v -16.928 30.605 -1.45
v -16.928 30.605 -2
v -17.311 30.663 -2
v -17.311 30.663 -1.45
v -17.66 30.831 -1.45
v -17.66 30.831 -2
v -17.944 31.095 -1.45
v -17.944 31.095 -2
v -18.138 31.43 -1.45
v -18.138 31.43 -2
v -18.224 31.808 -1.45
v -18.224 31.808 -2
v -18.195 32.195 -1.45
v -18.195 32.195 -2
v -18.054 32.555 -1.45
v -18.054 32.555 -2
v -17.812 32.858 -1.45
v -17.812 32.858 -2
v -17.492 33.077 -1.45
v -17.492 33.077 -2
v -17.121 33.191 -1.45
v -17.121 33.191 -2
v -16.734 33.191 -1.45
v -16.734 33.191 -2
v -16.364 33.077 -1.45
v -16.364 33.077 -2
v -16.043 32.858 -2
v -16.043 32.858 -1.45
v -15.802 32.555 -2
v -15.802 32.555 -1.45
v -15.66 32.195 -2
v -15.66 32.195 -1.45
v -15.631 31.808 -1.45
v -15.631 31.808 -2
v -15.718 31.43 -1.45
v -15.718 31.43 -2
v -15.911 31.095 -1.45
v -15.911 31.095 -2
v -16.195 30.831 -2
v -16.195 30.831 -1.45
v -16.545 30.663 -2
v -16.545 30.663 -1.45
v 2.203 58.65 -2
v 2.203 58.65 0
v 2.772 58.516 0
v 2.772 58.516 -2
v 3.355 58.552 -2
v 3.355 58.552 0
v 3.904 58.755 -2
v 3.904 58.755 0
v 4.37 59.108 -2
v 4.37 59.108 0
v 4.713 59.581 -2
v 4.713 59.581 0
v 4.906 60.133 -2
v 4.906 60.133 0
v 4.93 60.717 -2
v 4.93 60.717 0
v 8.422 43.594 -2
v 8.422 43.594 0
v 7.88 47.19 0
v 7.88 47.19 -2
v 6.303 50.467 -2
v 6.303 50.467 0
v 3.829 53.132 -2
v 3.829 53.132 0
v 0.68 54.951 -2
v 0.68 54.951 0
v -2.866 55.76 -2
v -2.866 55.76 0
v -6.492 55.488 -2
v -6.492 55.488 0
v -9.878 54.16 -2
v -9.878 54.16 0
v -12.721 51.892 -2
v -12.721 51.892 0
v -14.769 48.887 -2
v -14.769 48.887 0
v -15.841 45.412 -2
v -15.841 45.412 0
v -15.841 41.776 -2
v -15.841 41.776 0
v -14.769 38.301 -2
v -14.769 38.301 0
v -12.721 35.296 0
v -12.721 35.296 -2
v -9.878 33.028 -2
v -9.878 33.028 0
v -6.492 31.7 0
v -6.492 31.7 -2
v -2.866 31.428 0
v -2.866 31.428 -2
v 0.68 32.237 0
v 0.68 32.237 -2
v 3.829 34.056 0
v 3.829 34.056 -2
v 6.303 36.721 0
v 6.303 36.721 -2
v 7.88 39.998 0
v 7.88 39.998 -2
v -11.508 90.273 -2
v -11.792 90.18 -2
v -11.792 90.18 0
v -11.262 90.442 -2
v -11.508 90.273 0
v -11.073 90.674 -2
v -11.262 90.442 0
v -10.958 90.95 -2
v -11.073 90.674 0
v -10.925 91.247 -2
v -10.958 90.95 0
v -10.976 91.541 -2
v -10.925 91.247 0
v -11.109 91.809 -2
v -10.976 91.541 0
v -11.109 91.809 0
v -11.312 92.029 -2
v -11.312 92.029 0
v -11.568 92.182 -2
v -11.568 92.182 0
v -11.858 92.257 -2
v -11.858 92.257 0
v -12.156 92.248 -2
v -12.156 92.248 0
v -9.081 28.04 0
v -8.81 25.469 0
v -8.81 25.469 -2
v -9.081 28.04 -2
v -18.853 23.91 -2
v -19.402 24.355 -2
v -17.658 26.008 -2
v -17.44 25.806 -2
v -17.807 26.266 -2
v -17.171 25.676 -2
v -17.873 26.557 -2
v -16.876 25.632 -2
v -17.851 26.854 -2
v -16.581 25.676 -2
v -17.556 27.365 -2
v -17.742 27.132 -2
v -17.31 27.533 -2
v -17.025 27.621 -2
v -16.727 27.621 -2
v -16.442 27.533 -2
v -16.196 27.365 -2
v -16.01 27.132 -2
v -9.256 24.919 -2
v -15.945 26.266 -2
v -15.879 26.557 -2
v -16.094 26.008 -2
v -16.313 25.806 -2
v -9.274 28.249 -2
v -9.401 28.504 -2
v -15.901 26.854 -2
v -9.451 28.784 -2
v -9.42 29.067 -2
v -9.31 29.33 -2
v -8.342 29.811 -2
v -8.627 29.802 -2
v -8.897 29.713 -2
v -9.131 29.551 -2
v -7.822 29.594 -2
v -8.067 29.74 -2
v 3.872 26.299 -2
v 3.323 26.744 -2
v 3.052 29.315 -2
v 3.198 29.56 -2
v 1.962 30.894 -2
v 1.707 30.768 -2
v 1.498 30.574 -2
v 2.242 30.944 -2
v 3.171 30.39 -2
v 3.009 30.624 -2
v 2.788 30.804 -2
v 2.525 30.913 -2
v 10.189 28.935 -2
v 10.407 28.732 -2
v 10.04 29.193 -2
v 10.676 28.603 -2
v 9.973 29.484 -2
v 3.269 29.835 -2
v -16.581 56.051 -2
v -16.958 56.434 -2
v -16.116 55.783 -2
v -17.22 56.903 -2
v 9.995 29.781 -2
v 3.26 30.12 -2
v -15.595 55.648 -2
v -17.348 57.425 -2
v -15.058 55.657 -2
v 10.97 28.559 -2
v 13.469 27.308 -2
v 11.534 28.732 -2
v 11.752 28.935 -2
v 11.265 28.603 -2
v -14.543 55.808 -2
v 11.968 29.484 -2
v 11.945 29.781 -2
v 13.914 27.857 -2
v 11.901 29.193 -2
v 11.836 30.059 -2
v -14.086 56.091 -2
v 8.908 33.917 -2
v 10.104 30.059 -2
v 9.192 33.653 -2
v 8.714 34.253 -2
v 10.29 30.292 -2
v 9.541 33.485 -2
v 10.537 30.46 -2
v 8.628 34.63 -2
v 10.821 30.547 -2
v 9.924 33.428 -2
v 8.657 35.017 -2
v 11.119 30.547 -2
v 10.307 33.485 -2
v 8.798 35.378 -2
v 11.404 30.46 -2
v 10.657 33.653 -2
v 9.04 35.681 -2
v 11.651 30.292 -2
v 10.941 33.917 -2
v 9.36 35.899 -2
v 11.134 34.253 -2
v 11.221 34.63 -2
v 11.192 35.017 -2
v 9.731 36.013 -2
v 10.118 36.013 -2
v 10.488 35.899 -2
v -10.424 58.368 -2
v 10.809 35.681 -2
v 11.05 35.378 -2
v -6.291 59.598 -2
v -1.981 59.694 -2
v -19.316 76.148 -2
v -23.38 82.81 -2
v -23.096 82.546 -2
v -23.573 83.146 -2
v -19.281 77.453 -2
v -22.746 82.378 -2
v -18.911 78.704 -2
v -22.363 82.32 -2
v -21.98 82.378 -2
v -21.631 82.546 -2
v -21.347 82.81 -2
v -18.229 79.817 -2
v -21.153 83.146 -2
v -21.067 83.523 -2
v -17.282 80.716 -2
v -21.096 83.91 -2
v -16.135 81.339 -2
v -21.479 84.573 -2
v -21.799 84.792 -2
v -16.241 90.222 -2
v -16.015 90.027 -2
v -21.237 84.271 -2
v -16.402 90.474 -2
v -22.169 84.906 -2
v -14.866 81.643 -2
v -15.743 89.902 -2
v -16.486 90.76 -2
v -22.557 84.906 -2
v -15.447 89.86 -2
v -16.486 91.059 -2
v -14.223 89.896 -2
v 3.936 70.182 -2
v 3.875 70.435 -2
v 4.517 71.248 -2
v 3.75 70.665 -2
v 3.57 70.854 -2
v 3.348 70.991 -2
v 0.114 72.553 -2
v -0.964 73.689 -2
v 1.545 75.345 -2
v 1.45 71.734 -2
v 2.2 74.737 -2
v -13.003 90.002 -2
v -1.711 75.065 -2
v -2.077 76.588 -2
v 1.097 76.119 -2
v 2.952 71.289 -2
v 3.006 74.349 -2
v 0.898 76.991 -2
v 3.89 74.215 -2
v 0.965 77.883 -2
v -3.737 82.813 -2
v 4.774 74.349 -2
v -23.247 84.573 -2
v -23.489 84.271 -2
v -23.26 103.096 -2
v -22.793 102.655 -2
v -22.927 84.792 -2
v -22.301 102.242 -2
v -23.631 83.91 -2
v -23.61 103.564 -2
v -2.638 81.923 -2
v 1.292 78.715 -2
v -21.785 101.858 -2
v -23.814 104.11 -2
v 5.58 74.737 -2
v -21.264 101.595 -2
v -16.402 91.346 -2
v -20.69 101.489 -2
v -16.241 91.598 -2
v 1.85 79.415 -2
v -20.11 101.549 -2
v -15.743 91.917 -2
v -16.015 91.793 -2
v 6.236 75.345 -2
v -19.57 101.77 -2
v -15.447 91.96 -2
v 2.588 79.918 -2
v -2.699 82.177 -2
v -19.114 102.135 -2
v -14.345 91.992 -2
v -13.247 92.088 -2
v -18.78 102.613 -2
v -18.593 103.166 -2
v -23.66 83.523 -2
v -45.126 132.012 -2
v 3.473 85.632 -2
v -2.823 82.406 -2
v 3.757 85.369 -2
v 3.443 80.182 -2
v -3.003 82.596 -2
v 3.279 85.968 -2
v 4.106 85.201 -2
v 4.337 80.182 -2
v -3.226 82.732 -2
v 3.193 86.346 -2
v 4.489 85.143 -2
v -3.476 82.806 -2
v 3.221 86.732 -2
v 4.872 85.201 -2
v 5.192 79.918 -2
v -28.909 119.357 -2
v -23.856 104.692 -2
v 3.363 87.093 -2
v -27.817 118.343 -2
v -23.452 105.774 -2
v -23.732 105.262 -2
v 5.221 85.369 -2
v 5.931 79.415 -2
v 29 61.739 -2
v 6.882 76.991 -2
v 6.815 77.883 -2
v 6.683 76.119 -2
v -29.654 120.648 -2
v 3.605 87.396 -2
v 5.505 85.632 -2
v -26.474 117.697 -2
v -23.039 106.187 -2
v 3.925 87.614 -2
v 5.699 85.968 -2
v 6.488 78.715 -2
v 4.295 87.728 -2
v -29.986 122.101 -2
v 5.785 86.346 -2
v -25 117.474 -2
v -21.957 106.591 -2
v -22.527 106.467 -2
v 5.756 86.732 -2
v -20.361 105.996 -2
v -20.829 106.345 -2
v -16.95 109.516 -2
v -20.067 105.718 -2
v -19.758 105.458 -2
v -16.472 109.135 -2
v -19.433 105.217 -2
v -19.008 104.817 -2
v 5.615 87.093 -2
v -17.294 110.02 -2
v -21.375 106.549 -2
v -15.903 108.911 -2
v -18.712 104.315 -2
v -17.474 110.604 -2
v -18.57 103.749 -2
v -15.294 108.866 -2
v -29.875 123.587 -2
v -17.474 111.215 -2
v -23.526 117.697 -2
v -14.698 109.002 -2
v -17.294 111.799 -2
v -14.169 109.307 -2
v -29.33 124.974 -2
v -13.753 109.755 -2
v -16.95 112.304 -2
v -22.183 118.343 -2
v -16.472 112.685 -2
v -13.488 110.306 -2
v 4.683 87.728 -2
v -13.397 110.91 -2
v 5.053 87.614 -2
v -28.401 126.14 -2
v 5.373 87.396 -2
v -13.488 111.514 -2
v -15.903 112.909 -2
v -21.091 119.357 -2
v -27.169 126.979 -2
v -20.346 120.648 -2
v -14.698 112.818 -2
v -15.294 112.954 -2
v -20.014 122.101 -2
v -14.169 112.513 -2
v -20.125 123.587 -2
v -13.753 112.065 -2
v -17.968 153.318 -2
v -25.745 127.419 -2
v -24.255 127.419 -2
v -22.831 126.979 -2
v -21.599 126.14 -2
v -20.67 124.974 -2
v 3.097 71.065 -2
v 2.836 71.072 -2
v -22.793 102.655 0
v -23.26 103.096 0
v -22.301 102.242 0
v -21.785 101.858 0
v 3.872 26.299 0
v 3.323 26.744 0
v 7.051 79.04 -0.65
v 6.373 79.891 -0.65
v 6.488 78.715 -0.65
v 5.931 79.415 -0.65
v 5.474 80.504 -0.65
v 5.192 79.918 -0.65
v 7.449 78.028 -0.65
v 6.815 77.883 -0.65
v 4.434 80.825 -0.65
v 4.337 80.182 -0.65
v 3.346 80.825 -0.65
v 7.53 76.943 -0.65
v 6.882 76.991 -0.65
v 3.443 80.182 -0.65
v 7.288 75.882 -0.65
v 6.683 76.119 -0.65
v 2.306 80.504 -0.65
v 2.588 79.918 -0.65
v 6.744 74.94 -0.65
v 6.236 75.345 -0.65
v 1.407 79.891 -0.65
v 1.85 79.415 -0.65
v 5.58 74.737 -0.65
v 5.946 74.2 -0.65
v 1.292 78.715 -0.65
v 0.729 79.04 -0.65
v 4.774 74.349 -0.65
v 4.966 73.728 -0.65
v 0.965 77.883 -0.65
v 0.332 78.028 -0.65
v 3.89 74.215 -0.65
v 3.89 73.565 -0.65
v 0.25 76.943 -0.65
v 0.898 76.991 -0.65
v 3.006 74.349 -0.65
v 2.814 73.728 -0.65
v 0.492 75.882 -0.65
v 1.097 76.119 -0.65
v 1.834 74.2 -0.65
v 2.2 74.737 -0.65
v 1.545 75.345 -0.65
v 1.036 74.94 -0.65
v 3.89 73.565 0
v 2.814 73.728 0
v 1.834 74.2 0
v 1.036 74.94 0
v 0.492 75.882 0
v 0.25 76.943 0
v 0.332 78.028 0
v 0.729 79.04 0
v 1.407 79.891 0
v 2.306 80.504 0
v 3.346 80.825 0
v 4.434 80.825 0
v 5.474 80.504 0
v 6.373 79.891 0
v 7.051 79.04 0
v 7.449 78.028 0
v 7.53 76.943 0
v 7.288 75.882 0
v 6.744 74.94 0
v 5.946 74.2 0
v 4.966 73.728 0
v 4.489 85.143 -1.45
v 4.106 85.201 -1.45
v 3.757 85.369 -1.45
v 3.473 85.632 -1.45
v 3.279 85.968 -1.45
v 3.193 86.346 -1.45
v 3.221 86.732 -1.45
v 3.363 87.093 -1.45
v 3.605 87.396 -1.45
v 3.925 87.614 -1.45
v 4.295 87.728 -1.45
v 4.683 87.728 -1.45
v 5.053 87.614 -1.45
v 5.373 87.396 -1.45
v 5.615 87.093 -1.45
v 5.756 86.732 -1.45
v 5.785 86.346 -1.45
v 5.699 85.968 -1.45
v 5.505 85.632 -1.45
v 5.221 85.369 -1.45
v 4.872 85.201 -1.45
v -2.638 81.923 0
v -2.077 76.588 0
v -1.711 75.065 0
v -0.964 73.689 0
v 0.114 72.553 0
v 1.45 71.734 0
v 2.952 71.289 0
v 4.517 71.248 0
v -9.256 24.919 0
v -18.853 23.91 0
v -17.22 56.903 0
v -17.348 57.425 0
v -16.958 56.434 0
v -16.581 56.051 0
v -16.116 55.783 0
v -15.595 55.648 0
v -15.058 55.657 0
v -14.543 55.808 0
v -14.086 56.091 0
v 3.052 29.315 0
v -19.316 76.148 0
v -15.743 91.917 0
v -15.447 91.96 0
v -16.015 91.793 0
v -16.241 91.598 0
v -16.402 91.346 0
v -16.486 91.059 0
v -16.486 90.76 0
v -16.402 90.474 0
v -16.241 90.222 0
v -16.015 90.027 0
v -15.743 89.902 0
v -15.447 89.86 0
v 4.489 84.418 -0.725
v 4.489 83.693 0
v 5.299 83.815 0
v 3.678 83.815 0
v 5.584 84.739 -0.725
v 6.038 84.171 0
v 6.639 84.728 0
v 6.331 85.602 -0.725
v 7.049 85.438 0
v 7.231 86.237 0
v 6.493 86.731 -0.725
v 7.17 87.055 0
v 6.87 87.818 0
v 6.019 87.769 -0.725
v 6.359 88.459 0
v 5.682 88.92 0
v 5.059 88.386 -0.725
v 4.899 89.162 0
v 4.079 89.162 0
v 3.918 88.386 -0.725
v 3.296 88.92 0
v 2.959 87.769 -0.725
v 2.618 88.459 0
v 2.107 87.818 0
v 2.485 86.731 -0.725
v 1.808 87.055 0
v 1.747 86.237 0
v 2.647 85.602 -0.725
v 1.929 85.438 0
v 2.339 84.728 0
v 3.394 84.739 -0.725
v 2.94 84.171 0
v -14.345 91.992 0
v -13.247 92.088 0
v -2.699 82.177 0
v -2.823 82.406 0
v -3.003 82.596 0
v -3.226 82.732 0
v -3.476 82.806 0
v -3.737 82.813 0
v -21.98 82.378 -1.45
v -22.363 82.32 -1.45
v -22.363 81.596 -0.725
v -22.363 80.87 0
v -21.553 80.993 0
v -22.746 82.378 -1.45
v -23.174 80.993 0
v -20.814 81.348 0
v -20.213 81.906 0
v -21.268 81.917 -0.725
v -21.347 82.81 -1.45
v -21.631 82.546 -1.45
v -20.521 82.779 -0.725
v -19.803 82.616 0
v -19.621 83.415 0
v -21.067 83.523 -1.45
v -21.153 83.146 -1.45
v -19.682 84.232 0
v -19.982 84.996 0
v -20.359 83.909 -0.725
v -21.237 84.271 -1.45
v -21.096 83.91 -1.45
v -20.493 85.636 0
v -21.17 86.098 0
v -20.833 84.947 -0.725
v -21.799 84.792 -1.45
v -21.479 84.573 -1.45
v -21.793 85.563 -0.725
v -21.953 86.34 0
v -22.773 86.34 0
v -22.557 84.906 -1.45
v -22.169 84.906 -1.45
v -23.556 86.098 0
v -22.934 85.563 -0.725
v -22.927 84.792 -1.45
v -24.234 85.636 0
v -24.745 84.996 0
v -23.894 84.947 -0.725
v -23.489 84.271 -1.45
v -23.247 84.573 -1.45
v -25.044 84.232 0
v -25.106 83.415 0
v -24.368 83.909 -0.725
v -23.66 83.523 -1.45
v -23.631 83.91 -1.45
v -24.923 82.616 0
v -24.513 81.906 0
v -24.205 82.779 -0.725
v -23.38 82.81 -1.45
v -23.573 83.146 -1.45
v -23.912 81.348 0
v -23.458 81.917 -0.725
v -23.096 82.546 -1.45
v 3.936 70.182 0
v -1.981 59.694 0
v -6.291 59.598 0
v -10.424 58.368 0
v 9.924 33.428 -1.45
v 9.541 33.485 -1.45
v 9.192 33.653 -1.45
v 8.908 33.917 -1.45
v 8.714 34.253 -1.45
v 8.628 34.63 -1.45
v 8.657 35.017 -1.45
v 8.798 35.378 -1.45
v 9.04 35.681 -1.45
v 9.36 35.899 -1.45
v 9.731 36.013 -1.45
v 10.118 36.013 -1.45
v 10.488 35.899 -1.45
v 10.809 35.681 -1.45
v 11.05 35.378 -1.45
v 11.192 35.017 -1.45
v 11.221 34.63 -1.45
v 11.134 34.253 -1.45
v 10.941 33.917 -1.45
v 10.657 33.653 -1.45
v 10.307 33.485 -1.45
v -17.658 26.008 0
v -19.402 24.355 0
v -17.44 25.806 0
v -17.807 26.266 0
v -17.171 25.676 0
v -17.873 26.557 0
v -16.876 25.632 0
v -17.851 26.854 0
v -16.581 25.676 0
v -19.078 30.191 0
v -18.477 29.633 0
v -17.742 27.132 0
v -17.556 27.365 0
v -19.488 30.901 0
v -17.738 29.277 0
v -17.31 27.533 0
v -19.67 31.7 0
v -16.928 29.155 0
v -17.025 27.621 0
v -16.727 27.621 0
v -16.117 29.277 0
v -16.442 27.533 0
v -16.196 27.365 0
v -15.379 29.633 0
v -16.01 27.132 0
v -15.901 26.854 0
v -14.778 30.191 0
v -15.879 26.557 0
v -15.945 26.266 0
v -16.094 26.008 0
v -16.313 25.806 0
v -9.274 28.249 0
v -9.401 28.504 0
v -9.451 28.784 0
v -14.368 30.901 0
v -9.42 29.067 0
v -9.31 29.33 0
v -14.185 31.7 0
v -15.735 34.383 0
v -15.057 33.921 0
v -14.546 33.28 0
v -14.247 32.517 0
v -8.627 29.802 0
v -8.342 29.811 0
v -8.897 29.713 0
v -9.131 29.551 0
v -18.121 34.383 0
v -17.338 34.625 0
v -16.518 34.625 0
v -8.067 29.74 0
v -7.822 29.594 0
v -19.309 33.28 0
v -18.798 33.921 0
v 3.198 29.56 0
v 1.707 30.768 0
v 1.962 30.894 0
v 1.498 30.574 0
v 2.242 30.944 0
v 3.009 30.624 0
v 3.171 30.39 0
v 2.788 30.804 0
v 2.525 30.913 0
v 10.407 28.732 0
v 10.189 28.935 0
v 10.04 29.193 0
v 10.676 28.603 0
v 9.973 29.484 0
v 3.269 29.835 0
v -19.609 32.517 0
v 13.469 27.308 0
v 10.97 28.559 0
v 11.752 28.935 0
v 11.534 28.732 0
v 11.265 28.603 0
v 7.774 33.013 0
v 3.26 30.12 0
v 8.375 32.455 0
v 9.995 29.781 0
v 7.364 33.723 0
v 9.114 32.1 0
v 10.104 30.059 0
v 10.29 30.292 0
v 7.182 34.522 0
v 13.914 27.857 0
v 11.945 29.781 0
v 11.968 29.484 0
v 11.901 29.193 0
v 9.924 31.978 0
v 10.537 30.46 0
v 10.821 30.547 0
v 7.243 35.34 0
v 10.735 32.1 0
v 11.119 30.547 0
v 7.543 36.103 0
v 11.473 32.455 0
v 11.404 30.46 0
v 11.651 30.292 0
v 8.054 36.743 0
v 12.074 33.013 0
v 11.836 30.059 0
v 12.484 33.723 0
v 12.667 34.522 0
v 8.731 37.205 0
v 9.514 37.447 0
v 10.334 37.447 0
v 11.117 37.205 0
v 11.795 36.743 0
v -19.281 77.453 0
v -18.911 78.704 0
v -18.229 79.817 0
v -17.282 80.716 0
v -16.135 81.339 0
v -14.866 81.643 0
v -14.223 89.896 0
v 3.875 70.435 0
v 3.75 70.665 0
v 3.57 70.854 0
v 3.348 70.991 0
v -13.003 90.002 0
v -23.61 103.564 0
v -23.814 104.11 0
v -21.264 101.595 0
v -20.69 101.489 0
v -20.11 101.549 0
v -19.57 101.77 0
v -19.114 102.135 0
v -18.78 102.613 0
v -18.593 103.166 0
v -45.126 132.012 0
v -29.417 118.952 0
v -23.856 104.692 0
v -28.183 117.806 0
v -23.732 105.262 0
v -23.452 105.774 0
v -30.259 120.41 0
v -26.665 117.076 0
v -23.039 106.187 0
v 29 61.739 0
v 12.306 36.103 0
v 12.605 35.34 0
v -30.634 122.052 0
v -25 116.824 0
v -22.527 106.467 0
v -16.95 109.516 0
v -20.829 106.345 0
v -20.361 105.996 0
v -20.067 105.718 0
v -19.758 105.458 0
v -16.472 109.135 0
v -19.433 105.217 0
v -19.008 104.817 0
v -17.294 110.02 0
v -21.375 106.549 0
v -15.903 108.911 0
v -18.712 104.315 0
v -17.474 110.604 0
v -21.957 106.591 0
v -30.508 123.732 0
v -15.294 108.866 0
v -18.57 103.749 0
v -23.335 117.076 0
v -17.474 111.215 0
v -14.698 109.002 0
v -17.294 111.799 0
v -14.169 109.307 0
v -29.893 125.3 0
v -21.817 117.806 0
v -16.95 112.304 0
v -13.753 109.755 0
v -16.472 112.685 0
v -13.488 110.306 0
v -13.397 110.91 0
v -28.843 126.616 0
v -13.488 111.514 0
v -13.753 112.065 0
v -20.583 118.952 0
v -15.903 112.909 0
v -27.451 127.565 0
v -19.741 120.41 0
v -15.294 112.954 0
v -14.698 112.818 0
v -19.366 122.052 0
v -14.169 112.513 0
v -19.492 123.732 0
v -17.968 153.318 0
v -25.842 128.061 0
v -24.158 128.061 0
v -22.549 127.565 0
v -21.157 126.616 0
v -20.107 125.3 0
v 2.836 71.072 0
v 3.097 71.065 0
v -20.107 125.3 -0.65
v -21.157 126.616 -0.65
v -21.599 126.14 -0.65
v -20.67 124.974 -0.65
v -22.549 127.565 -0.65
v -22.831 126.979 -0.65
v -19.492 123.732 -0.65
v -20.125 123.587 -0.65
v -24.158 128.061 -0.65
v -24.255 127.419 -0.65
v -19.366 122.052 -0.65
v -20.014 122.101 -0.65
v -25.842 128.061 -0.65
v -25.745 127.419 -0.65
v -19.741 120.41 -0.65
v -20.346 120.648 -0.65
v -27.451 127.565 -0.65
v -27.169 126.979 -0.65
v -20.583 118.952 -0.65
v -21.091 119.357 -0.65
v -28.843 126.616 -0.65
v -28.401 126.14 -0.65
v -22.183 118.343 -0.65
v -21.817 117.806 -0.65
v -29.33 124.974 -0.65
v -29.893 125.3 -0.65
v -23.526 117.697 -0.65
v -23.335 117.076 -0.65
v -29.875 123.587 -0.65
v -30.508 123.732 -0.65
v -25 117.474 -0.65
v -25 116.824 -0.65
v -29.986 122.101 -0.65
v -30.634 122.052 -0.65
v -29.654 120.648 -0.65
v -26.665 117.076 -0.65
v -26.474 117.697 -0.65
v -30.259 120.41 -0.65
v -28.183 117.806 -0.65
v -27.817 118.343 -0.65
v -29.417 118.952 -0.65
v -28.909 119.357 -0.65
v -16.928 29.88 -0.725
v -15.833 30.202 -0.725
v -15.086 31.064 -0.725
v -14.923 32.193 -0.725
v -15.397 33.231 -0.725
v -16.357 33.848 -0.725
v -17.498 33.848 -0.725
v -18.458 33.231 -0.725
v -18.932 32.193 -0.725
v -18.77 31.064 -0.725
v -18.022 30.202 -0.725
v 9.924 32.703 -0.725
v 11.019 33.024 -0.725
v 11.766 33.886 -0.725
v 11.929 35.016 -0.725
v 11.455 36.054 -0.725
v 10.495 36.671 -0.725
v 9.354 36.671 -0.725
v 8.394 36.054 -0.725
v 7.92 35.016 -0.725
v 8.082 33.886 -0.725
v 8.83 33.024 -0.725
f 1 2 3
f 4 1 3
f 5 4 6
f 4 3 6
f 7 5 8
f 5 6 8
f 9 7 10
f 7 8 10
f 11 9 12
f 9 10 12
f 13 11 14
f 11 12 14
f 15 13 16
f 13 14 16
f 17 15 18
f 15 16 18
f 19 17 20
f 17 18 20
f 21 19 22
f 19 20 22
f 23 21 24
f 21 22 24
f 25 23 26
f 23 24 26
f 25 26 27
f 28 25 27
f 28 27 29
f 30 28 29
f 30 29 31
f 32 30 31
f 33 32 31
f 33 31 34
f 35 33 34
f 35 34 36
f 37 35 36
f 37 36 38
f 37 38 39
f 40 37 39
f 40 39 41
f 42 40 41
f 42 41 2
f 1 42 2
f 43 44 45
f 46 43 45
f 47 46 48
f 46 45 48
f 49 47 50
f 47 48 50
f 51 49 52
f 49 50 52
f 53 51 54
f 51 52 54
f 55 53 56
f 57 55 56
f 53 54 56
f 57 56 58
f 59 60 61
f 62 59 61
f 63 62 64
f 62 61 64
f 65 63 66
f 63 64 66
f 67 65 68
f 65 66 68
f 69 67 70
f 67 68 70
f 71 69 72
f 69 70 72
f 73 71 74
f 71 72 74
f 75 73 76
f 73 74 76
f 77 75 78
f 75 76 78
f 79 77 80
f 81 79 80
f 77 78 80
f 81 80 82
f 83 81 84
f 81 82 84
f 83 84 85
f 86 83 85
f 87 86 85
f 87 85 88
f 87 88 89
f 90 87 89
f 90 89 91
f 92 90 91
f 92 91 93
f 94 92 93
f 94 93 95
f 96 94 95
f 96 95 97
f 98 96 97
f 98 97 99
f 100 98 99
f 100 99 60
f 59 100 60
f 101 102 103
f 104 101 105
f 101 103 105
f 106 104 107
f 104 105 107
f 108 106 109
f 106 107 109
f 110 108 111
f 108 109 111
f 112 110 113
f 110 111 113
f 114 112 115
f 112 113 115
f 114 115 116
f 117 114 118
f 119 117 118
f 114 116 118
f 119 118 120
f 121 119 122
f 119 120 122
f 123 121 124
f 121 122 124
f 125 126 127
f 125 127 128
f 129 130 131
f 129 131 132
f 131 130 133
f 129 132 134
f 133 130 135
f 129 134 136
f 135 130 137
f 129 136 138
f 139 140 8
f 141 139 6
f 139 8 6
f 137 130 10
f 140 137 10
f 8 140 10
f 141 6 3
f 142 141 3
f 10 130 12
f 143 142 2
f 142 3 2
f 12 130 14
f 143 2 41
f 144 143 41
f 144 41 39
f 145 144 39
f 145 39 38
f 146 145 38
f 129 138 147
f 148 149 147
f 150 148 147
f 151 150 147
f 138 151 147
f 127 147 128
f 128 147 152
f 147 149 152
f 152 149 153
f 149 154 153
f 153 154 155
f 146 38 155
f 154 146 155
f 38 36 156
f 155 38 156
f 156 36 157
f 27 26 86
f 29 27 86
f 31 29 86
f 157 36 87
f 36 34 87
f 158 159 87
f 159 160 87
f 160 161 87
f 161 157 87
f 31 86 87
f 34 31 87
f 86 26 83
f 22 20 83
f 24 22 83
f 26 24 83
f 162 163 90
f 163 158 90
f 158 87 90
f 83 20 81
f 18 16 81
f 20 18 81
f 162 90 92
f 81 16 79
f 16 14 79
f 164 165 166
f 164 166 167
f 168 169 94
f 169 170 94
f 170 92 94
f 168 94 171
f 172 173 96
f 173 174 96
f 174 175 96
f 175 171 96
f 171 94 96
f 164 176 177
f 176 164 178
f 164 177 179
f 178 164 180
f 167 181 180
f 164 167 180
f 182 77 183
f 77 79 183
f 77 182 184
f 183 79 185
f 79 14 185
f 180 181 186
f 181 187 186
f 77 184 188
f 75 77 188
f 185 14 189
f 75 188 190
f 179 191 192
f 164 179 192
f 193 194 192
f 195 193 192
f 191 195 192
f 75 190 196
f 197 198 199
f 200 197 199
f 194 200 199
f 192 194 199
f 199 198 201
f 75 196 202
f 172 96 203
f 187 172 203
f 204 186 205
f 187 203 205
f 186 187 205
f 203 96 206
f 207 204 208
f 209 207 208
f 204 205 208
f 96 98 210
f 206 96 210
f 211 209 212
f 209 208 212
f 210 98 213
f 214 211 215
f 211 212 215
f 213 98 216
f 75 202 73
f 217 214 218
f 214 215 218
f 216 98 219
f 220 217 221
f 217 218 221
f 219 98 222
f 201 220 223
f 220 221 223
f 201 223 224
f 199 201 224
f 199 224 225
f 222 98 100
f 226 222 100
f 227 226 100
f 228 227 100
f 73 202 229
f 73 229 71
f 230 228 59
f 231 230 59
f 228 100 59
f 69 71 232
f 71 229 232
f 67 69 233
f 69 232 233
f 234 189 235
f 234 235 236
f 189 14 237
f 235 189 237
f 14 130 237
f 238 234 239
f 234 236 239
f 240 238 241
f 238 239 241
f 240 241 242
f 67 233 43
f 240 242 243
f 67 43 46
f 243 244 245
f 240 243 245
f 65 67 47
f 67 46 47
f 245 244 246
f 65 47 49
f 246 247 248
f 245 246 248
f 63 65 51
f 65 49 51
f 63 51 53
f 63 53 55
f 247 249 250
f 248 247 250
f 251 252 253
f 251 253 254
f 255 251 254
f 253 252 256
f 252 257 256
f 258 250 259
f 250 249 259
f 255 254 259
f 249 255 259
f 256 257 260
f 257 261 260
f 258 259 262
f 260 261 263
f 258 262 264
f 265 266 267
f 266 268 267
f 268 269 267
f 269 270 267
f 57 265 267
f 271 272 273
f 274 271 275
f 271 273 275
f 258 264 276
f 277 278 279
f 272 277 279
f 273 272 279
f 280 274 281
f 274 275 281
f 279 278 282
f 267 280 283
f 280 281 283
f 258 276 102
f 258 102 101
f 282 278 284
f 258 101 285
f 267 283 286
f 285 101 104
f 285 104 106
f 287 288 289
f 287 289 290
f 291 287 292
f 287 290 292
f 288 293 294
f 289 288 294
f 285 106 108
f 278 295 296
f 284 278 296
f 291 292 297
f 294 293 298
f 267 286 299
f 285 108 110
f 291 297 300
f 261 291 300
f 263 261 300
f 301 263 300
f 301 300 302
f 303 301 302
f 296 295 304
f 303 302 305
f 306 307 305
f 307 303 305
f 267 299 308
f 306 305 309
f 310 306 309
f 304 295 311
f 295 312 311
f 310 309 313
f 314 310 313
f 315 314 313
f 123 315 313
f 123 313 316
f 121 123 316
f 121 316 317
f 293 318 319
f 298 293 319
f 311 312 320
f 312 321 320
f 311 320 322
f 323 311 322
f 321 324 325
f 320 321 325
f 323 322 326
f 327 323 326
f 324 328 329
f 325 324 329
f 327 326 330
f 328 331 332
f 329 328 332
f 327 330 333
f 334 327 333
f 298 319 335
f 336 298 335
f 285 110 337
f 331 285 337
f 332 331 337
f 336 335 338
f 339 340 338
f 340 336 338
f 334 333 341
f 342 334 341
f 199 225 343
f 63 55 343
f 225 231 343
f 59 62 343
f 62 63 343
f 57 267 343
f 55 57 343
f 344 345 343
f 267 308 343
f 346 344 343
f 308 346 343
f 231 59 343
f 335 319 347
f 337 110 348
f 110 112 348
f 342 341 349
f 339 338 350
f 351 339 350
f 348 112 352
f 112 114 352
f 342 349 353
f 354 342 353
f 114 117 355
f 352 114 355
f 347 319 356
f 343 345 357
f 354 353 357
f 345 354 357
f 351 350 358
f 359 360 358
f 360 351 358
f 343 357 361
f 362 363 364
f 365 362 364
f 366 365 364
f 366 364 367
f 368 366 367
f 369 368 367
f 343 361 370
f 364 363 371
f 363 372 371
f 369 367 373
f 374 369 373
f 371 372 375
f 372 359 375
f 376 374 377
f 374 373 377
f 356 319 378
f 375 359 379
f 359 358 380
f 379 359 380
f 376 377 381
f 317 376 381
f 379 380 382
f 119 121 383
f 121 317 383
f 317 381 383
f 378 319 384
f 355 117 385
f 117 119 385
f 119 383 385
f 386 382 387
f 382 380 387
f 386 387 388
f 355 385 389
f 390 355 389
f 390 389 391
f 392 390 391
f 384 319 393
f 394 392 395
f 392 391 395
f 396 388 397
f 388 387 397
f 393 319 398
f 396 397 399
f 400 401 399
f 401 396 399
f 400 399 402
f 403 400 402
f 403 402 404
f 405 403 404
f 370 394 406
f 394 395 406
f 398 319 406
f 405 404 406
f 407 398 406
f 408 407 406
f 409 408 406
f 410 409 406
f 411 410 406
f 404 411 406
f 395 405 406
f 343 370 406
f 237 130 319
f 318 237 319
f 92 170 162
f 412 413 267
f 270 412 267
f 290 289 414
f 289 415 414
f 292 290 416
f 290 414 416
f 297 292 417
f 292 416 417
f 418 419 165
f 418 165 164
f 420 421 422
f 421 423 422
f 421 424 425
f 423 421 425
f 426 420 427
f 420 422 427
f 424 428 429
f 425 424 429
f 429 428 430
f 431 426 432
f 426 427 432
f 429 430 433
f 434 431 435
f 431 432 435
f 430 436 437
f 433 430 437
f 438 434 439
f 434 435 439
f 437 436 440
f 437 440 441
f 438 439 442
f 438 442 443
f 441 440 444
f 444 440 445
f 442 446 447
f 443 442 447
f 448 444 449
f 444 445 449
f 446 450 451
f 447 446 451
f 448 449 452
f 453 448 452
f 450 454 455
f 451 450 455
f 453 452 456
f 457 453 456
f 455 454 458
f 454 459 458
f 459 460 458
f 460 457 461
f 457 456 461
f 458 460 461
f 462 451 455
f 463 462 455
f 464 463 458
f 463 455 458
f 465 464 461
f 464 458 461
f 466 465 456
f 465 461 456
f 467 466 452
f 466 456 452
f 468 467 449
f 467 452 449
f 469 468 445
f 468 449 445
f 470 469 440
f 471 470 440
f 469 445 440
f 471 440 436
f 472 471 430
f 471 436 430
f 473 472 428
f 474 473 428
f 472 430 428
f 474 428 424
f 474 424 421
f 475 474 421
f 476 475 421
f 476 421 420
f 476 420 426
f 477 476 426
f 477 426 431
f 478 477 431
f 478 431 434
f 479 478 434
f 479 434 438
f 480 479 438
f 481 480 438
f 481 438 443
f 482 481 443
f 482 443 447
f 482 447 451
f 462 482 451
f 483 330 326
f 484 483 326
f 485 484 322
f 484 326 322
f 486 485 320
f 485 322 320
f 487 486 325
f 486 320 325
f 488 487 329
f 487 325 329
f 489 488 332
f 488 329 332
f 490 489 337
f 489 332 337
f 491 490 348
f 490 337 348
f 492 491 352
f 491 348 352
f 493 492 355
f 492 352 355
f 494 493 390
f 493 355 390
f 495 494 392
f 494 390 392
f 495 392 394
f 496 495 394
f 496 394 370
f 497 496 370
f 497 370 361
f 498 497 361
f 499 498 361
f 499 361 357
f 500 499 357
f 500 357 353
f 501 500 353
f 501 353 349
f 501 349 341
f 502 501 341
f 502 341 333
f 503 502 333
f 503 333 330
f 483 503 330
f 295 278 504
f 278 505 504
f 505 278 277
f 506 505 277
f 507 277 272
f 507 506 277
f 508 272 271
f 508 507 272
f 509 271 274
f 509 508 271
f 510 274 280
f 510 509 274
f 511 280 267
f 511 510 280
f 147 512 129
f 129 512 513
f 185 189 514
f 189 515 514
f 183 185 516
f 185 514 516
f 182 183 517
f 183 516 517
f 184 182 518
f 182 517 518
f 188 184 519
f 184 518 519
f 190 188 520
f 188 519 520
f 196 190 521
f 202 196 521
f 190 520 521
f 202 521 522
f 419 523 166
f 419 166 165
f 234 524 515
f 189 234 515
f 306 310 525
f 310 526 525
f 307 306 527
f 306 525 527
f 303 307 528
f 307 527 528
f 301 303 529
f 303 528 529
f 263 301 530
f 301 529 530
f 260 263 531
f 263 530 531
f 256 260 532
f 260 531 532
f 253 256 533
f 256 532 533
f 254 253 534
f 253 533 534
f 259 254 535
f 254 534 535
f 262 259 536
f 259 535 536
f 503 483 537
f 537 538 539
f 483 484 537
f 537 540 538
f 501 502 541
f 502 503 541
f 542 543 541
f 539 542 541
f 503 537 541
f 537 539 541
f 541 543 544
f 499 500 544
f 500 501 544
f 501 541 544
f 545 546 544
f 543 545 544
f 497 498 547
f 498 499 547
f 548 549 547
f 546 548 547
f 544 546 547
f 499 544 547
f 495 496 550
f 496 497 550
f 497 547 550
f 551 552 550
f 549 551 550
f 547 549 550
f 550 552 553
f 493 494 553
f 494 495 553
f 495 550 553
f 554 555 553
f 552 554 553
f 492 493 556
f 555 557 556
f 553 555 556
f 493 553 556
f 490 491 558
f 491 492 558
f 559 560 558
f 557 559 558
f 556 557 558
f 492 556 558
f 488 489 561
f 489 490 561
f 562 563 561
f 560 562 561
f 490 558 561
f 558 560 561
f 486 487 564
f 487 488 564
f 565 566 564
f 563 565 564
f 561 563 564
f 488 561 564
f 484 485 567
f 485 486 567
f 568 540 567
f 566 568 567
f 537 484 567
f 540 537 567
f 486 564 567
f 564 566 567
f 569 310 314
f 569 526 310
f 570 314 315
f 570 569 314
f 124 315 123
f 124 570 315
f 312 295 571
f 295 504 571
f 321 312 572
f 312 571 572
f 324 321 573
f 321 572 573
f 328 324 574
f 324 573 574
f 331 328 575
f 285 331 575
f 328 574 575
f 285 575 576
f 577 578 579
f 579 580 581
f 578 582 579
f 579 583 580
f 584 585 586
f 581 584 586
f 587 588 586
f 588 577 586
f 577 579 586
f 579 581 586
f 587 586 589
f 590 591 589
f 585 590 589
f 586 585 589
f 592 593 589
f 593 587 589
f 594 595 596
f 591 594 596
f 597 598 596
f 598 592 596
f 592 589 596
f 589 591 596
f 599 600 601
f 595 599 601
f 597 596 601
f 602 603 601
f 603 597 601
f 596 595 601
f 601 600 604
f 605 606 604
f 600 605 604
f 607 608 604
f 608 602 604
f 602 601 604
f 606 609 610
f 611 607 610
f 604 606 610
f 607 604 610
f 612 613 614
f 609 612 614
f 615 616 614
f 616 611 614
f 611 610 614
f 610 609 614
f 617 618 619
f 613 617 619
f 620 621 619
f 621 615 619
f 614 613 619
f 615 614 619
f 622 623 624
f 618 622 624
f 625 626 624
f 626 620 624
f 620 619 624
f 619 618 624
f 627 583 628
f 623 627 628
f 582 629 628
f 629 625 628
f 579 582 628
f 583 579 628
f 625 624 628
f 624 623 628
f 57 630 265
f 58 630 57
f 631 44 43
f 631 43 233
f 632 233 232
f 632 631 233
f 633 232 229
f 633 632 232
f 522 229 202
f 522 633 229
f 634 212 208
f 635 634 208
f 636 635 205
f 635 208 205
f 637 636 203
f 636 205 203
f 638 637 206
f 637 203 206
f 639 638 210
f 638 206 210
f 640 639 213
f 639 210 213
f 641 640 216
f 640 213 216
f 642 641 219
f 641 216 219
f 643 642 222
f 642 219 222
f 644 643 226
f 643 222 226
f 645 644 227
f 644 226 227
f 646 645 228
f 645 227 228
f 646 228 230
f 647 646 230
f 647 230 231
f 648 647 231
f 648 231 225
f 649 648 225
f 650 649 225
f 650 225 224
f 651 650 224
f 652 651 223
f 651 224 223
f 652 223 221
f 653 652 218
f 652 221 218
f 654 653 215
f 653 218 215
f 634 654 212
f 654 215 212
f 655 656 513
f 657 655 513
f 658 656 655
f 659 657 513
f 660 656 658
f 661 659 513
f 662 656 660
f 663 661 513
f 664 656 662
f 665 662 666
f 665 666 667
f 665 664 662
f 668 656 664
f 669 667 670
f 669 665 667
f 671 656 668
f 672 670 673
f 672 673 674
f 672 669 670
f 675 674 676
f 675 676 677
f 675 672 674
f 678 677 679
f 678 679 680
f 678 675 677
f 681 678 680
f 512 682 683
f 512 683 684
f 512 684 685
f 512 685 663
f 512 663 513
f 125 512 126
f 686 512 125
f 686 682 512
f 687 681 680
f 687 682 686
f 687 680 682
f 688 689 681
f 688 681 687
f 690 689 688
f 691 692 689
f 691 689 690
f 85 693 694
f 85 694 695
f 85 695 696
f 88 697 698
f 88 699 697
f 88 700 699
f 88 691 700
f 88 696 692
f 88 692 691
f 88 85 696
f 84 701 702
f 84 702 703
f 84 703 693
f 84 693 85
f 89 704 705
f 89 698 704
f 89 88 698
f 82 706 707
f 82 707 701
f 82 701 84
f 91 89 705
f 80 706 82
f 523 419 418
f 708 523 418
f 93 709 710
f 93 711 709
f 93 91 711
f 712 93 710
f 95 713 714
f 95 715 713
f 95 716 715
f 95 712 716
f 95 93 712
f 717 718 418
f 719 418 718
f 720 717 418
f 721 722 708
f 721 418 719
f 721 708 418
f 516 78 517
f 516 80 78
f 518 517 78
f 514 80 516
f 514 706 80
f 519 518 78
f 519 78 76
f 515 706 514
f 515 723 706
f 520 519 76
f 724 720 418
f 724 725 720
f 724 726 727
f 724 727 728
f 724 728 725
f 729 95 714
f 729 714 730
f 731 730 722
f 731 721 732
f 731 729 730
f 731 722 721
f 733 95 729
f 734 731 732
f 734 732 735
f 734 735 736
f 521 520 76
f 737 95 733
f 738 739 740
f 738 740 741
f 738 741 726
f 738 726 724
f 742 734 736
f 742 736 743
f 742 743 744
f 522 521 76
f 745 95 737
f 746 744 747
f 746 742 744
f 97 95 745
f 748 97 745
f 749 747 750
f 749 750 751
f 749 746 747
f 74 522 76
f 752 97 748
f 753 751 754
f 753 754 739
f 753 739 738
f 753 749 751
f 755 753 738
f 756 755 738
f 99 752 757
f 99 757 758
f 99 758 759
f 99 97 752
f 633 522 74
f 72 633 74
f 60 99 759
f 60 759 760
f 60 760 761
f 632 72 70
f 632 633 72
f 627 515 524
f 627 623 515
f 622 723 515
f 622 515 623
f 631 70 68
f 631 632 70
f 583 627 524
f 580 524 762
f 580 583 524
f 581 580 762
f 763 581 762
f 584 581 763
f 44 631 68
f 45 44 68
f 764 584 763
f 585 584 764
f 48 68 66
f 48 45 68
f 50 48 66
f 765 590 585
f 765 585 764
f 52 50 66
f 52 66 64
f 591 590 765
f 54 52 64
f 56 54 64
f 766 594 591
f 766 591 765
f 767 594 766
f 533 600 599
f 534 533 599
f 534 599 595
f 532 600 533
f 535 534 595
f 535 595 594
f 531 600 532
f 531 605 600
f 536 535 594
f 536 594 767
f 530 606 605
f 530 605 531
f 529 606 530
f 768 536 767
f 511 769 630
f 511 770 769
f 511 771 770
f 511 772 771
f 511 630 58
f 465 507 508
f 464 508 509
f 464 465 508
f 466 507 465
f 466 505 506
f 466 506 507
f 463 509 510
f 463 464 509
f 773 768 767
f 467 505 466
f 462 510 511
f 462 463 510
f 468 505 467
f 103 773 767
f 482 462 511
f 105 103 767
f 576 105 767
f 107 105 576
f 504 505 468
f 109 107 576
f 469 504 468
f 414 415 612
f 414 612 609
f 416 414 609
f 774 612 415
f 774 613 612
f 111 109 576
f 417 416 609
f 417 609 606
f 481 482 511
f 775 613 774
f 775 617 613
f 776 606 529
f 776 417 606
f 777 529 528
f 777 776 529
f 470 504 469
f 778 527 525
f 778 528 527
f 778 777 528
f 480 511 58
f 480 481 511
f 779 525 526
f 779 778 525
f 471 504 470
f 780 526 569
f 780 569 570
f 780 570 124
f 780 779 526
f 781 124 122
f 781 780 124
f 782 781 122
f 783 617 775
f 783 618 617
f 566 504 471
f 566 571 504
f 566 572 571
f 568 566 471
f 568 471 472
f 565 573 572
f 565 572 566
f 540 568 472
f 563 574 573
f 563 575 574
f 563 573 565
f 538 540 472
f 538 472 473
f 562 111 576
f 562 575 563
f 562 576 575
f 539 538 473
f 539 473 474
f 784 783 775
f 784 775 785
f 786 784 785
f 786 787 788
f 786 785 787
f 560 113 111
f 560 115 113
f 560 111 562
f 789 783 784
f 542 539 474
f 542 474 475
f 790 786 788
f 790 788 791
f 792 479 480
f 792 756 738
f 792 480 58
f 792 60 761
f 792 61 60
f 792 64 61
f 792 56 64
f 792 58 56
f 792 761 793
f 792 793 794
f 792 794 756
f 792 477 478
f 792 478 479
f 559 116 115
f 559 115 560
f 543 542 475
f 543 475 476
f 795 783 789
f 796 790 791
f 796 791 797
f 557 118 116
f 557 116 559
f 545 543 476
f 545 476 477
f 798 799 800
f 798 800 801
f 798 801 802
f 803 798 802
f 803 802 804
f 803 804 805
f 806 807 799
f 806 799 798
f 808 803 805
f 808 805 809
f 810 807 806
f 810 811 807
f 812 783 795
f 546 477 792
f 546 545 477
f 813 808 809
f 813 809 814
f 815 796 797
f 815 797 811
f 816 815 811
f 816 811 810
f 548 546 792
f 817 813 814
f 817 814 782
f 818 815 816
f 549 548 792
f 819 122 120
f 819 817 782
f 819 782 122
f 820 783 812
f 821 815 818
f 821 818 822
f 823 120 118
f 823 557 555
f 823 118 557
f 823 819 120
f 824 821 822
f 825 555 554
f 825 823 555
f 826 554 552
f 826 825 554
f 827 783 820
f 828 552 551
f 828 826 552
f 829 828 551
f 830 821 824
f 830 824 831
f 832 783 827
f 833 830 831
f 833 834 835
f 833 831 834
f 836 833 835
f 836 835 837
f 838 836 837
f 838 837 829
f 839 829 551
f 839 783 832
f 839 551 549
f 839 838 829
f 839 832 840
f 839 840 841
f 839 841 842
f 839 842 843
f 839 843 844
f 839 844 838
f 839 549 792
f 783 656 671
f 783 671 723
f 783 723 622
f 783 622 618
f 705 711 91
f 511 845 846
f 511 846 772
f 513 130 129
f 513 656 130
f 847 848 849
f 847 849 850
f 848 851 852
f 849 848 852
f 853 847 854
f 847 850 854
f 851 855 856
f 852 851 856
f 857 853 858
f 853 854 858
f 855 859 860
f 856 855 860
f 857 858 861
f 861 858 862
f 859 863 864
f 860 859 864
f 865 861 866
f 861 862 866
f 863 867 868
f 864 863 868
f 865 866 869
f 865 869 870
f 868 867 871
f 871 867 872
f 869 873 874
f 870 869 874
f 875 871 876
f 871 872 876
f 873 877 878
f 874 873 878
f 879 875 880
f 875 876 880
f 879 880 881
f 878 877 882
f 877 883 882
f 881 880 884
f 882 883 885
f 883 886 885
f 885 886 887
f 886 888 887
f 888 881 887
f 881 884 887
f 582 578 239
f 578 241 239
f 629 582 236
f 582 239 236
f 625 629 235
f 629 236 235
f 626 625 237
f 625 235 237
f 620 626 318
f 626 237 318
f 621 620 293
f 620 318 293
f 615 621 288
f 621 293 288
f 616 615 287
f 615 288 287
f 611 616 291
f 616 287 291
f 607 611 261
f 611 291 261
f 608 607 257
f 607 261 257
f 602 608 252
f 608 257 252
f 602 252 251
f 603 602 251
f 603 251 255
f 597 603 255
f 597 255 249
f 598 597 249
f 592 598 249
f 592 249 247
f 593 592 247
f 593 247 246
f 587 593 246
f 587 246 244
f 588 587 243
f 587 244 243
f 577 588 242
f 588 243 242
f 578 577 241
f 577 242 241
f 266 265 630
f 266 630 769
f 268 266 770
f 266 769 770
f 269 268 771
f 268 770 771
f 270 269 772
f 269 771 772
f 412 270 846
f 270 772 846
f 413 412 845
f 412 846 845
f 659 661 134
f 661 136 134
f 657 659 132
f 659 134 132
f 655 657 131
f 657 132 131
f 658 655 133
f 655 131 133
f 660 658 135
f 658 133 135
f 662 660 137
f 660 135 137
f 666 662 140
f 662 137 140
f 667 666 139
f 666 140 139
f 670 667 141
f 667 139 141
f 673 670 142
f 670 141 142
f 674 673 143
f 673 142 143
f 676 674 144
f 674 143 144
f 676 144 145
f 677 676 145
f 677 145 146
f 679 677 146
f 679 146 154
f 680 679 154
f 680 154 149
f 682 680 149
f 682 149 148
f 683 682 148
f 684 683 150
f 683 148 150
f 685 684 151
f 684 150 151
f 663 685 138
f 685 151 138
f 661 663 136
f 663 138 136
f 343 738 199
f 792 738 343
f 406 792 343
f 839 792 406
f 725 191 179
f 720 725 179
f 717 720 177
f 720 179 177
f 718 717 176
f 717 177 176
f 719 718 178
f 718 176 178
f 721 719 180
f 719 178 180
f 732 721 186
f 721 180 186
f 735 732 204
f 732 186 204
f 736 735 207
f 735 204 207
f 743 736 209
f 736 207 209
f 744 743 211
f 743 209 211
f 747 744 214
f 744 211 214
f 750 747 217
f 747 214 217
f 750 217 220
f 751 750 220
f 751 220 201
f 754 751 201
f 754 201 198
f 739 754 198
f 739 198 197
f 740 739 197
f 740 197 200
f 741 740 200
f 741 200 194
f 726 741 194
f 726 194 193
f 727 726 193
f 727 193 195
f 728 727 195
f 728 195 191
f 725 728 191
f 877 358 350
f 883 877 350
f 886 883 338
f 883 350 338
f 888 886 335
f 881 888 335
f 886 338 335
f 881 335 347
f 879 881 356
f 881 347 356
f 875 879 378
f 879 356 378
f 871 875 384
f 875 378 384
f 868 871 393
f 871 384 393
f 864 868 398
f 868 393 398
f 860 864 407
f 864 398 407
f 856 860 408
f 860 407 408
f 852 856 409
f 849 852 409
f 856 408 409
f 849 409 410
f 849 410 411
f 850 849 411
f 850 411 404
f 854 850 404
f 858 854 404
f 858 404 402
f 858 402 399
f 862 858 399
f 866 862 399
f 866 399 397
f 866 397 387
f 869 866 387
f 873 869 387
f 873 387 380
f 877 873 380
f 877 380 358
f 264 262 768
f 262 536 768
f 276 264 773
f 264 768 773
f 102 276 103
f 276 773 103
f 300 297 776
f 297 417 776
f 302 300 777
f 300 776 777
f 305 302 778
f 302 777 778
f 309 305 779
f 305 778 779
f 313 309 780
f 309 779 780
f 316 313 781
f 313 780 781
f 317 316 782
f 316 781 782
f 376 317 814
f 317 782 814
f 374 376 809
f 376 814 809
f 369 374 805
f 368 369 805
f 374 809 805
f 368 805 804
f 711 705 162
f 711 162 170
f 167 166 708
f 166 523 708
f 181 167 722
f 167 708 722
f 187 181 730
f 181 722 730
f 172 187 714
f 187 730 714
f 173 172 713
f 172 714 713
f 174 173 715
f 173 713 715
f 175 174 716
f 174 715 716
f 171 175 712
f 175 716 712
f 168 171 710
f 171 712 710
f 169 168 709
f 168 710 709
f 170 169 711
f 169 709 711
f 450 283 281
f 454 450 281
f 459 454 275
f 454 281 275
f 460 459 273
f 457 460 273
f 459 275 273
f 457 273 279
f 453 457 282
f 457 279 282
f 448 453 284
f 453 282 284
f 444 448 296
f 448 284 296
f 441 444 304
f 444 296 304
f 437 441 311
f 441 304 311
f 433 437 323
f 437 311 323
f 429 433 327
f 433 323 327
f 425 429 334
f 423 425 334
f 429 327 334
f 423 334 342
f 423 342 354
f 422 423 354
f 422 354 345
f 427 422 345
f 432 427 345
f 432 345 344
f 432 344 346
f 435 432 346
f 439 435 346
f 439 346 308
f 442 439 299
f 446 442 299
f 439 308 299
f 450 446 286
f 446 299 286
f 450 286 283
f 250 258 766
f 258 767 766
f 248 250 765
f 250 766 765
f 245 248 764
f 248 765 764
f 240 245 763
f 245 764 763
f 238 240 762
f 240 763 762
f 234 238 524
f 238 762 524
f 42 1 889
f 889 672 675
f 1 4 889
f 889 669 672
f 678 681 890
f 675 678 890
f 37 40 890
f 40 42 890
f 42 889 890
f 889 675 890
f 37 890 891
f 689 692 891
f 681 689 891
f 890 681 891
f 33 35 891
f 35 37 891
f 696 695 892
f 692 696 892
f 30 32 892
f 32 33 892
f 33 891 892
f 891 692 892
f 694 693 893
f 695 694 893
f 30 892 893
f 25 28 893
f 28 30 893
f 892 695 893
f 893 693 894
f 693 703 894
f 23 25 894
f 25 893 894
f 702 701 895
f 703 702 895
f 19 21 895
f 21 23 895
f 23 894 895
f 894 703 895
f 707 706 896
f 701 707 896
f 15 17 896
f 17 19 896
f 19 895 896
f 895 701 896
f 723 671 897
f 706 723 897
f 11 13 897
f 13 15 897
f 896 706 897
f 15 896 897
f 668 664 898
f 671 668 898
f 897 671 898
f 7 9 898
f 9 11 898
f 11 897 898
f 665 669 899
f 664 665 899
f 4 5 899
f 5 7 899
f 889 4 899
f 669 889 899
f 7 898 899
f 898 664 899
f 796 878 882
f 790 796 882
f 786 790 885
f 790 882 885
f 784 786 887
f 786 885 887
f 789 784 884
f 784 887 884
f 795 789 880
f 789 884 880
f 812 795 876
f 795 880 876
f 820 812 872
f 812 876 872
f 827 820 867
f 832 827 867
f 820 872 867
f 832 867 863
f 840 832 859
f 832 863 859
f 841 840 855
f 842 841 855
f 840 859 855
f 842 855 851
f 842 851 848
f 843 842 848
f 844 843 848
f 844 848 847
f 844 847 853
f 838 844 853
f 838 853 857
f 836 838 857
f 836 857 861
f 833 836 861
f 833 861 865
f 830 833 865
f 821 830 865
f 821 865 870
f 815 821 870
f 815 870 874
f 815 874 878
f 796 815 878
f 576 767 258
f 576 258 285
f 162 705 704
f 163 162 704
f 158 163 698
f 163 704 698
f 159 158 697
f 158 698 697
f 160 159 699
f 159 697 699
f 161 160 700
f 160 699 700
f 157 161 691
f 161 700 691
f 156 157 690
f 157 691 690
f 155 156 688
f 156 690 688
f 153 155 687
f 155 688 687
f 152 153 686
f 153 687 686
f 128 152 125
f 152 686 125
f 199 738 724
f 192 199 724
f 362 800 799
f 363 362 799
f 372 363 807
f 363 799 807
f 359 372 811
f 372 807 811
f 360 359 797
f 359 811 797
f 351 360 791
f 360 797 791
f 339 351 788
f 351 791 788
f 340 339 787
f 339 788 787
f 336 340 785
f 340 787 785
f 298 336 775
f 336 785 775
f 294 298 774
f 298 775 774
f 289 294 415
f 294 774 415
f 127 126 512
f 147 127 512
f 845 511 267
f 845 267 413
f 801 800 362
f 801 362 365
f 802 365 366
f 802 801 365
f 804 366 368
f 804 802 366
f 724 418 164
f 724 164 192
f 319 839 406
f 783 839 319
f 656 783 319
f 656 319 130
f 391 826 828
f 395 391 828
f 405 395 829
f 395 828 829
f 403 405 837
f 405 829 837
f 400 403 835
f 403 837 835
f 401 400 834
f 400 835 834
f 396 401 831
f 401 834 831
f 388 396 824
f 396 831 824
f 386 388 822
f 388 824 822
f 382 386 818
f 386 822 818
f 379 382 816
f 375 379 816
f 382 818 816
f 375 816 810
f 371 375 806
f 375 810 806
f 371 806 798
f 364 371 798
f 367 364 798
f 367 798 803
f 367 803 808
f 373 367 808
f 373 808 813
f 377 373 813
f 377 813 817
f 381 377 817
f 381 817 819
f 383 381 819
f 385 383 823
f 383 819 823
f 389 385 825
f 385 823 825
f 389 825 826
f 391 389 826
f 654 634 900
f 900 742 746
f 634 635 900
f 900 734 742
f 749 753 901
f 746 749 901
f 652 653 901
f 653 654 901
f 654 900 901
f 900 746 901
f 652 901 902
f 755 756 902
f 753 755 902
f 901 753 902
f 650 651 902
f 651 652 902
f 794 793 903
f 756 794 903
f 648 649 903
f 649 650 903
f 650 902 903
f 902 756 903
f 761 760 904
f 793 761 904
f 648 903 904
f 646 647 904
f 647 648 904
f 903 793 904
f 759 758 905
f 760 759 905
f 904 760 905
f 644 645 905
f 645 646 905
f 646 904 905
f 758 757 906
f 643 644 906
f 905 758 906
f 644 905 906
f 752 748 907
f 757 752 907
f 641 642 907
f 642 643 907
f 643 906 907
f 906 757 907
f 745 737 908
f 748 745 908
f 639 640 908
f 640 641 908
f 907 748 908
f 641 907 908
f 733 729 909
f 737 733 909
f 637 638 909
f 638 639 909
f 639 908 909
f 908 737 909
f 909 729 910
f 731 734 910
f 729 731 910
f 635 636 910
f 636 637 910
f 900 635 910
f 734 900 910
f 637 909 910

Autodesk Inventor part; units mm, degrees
ref_plane "YZ Plane" through (0, 0, 0) normal (1, 0, 0) x (0, 1, 0)
ref_plane "XZ Plane" through (0, 0, 0) normal (0, 1, 0) x (-1, 0, 0)
ref_plane "XY Plane" through (0, 0, 0) normal (0, 0, 1) x (1, 0, 0)
sketch "スケッチ1" plane through (0, 0, 0) normal (0, 0, 1) x (1, 0, 0)
  line L0 (0, 0) -> (-7.8332, 74.5283) construction
  line L1 (0, 0) -> (0, 134.5604) construction
  circle A0 centre (-16.8762, 26.6318) radius 1 construction
  circle A1 centre (10.9704, 29.5586) radius 1 construction
  line L2 (3.0524, 29.3154) -> (3.3227, 26.7438) projected
  arc A2 (3.0524, 29.3154) -> (1.4981, 30.5741) centre (2.2753, 29.9448) ccw projected
  arc A3 (-7.8221, 29.5945) -> (-9.0807, 28.0402) centre (-8.4514, 28.8173) ccw projected
  line L3 (-8.8105, 25.4686) -> (-9.0807, 28.0402) projected
  line L4 (13.9144, 27.8571) -> (7.5904, 88.0256) construction
  line L5 (13.9144, 27.8571) -> (28.9995, 61.7387)
  line L6 (-8.8105, 25.4686) -> (-9.2555, 24.9191)
  line L7 (-9.2555, 24.9191) -> (-18.8526, 23.9104)
  line L8 (3.3227, 26.7438) -> (3.8722, 26.2988)
  line L9 (3.8722, 26.2988) -> (13.4694, 27.3075)
  line L10 (-7.8221, 29.5945) -> (1.4981, 30.5741)
  line L11 (3.8722, 26.2988) -> (-9.2555, 24.9191) construction
  arc A4 (-10.8792, -1.6259) -> (-18.8786, 22.5819) centre (-85.0554, -12.7116) ccw construction
  line L12 (13.9144, 27.8571) -> (13.4694, 27.3075)
  line L13 (-19.4021, 24.3553) -> (-18.8526, 23.9104)
  circle A5 centre (3.8901, 77.2154) radius 7.16 construction
  circle A6 centre (-25, 122.4745) radius 9.55 construction
  circle A7 centre (-21.2321, 104.0155) radius 2 construction
  line L14 (-15.9609, 44.2312) -> (-19.3155, 76.1481) construction
  arc A8 (-14.8655, 81.6434) -> (-19.3155, 76.1481) centre (-14.3428, 76.6708) ccw projected
  line L15 (-14.8655, 81.6434) -> (-2.434, 82.95) construction
  line L16 (3.0613, 78.5) -> (5.9572, 50.9476) construction
  line L17 (4.5173, 71.2482) -> (2.8365, 71.0716)
  line L18 (-2.077, 76.5882) -> (-2.6377, 81.9231)
  arc A9 (-2.077, 76.5882) -> (4.5173, 71.2482) centre (3.8901, 77.2154) ccw
  line L19 (-14.8655, 81.6434) -> (-3.7368, 82.8131)
  line L20 (3.9356, 70.1816) -> (4.9303, 60.7174)
  arc A10 (-2.6377, 81.9231) -> (-3.7368, 82.8131) centre (-3.6323, 81.8185) ccw
  arc A11 (3.9356, 70.1816) -> (2.8365, 71.0716) centre (2.9411, 70.077) ccw
  line L21 (-19.3155, 76.1481) -> (-17.3476, 57.4248)
  circle A12 centre (-3.7775, 43.594) radius 12 construction
  circle A13 centre (-3.7775, 43.594) radius 12.2
  arc A14 (2.2029, 58.6497) -> (-14.0859, 56.0911) centre (-3.7775, 43.594) ccw
  arc A15 (2.2029, 58.6497) -> (4.9303, 60.7174) centre (2.9413, 60.5084) ccw
  arc A16 (-17.3476, 57.4248) -> (-14.0859, 56.0911) centre (-15.3585, 57.6339) ccw
  circle A17 centre (-22.3632, 83.6205) radius 1.3 construction
  circle A18 centre (4.4889, 86.4428) radius 1.3 construction
  circle A19 centre (9.9243, 34.7276) radius 1.3 construction
  circle A20 centre (-16.9277, 31.9053) radius 1.3 construction
  circle A21 centre (-15.447, 110.9099) radius 2.05 projected
  arc A22 (-21.785, 101.8583) -> (-19.4333, 105.2168) centre (-20.6092, 103.5375) ccw projected
  arc A23 (-19.6004, 105.3375) -> (-19.4333, 105.2168) centre (-15.447, 110.9099) ccw construction
  arc A24 (-20.3614, 105.9955) -> (-23.2605, 103.0964) centre (-21.8109, 104.5459) ccw projected
  arc A25 (-23.2605, 103.0964) -> (-21.785, 101.8583) centre (-15.447, 110.9099) ccw projected
  arc A26 (-20.3614, 105.9955) -> (-19.4333, 105.2168) centre (-15.447, 110.9099) ccw
  arc A27 (-15.447, 91.9599) -> (-12.1564, 92.2478) centre (-15.447, 110.9099) ccw projected
  arc A28 (-11.7917, 90.1797) -> (-12.1564, 92.2478) centre (-11.974, 91.2137) ccw projected
  arc A29 (-15.447, 89.8599) -> (-11.7917, 90.1797) centre (-15.447, 110.9099) ccw projected
  arc A30 (-15.447, 91.9599) -> (-15.447, 89.8599) centre (-15.447, 90.9099) ccw projected
  line L22 (-25, 122.4745) -> (0, 0) construction
  line L23 (28.9995, 61.7387) -> (-17.9684, 153.3176)
  line L24 (-17.9684, 153.3176) -> (-45.126, 132.0122)
  line L25 (-45.126, 132.0122) -> (-19.4021, 24.3553)
  point P0 (3.8311, 71.1761)
  point P1 (-2.7423, 82.9176)
  point P2 (5.3213, 56.9974)
  point P3 (-16.8933, 53.1027)
  point P4 (-16.8933, 53.1027)
  dimension "d0" = 6
  dimension "d1" = 45
  dimension "d2" = 45
  dimension "d3" = 0.5
  dimension "d4" = 45
  dimension "d5" = 45
  dimension "d6" = 6
  dimension "d7" = 1
  dimension "d8" = 0.2
  dimension "d10" = 4
  dimension "d11" = 2
  dimension "d42" = 30
extrude "押し出し1" add sketch "スケッチ1" against normal blind 2
hole "穴1" at (10.9704, 29.5586, 0) at (-16.8762, 26.6318, 0) direction (0, 0, -1) diameter 2 end through all
hole "穴2" at (9.9243, 34.7276, 0) at (4.4889, 86.4428, 0) at (-22.3632, 83.6205, 0) at (-16.9277, 31.9053, 0) direction (0, 0, -1) diameter 2.6 end through all countersink diameter 5.5 countersink angle 90 clearance for "Countersunk Flat Head Screw ISO 2009/7046" size "M2.5" standard "ISO"
hole "穴3" at (-25, 122.4745, 0) direction (0, 0, -1) diameter 10 end through all counterbore diameter 11.3 counterbore depth 0.65
hole "穴4" at (3.8901, 77.2154, 0) direction (0, 0, -1) diameter 6 end through all counterbore diameter 7.3 counterbore depth 0.65
properties part number "UPPER_LEG_MIDDLE_FRAME_2"
